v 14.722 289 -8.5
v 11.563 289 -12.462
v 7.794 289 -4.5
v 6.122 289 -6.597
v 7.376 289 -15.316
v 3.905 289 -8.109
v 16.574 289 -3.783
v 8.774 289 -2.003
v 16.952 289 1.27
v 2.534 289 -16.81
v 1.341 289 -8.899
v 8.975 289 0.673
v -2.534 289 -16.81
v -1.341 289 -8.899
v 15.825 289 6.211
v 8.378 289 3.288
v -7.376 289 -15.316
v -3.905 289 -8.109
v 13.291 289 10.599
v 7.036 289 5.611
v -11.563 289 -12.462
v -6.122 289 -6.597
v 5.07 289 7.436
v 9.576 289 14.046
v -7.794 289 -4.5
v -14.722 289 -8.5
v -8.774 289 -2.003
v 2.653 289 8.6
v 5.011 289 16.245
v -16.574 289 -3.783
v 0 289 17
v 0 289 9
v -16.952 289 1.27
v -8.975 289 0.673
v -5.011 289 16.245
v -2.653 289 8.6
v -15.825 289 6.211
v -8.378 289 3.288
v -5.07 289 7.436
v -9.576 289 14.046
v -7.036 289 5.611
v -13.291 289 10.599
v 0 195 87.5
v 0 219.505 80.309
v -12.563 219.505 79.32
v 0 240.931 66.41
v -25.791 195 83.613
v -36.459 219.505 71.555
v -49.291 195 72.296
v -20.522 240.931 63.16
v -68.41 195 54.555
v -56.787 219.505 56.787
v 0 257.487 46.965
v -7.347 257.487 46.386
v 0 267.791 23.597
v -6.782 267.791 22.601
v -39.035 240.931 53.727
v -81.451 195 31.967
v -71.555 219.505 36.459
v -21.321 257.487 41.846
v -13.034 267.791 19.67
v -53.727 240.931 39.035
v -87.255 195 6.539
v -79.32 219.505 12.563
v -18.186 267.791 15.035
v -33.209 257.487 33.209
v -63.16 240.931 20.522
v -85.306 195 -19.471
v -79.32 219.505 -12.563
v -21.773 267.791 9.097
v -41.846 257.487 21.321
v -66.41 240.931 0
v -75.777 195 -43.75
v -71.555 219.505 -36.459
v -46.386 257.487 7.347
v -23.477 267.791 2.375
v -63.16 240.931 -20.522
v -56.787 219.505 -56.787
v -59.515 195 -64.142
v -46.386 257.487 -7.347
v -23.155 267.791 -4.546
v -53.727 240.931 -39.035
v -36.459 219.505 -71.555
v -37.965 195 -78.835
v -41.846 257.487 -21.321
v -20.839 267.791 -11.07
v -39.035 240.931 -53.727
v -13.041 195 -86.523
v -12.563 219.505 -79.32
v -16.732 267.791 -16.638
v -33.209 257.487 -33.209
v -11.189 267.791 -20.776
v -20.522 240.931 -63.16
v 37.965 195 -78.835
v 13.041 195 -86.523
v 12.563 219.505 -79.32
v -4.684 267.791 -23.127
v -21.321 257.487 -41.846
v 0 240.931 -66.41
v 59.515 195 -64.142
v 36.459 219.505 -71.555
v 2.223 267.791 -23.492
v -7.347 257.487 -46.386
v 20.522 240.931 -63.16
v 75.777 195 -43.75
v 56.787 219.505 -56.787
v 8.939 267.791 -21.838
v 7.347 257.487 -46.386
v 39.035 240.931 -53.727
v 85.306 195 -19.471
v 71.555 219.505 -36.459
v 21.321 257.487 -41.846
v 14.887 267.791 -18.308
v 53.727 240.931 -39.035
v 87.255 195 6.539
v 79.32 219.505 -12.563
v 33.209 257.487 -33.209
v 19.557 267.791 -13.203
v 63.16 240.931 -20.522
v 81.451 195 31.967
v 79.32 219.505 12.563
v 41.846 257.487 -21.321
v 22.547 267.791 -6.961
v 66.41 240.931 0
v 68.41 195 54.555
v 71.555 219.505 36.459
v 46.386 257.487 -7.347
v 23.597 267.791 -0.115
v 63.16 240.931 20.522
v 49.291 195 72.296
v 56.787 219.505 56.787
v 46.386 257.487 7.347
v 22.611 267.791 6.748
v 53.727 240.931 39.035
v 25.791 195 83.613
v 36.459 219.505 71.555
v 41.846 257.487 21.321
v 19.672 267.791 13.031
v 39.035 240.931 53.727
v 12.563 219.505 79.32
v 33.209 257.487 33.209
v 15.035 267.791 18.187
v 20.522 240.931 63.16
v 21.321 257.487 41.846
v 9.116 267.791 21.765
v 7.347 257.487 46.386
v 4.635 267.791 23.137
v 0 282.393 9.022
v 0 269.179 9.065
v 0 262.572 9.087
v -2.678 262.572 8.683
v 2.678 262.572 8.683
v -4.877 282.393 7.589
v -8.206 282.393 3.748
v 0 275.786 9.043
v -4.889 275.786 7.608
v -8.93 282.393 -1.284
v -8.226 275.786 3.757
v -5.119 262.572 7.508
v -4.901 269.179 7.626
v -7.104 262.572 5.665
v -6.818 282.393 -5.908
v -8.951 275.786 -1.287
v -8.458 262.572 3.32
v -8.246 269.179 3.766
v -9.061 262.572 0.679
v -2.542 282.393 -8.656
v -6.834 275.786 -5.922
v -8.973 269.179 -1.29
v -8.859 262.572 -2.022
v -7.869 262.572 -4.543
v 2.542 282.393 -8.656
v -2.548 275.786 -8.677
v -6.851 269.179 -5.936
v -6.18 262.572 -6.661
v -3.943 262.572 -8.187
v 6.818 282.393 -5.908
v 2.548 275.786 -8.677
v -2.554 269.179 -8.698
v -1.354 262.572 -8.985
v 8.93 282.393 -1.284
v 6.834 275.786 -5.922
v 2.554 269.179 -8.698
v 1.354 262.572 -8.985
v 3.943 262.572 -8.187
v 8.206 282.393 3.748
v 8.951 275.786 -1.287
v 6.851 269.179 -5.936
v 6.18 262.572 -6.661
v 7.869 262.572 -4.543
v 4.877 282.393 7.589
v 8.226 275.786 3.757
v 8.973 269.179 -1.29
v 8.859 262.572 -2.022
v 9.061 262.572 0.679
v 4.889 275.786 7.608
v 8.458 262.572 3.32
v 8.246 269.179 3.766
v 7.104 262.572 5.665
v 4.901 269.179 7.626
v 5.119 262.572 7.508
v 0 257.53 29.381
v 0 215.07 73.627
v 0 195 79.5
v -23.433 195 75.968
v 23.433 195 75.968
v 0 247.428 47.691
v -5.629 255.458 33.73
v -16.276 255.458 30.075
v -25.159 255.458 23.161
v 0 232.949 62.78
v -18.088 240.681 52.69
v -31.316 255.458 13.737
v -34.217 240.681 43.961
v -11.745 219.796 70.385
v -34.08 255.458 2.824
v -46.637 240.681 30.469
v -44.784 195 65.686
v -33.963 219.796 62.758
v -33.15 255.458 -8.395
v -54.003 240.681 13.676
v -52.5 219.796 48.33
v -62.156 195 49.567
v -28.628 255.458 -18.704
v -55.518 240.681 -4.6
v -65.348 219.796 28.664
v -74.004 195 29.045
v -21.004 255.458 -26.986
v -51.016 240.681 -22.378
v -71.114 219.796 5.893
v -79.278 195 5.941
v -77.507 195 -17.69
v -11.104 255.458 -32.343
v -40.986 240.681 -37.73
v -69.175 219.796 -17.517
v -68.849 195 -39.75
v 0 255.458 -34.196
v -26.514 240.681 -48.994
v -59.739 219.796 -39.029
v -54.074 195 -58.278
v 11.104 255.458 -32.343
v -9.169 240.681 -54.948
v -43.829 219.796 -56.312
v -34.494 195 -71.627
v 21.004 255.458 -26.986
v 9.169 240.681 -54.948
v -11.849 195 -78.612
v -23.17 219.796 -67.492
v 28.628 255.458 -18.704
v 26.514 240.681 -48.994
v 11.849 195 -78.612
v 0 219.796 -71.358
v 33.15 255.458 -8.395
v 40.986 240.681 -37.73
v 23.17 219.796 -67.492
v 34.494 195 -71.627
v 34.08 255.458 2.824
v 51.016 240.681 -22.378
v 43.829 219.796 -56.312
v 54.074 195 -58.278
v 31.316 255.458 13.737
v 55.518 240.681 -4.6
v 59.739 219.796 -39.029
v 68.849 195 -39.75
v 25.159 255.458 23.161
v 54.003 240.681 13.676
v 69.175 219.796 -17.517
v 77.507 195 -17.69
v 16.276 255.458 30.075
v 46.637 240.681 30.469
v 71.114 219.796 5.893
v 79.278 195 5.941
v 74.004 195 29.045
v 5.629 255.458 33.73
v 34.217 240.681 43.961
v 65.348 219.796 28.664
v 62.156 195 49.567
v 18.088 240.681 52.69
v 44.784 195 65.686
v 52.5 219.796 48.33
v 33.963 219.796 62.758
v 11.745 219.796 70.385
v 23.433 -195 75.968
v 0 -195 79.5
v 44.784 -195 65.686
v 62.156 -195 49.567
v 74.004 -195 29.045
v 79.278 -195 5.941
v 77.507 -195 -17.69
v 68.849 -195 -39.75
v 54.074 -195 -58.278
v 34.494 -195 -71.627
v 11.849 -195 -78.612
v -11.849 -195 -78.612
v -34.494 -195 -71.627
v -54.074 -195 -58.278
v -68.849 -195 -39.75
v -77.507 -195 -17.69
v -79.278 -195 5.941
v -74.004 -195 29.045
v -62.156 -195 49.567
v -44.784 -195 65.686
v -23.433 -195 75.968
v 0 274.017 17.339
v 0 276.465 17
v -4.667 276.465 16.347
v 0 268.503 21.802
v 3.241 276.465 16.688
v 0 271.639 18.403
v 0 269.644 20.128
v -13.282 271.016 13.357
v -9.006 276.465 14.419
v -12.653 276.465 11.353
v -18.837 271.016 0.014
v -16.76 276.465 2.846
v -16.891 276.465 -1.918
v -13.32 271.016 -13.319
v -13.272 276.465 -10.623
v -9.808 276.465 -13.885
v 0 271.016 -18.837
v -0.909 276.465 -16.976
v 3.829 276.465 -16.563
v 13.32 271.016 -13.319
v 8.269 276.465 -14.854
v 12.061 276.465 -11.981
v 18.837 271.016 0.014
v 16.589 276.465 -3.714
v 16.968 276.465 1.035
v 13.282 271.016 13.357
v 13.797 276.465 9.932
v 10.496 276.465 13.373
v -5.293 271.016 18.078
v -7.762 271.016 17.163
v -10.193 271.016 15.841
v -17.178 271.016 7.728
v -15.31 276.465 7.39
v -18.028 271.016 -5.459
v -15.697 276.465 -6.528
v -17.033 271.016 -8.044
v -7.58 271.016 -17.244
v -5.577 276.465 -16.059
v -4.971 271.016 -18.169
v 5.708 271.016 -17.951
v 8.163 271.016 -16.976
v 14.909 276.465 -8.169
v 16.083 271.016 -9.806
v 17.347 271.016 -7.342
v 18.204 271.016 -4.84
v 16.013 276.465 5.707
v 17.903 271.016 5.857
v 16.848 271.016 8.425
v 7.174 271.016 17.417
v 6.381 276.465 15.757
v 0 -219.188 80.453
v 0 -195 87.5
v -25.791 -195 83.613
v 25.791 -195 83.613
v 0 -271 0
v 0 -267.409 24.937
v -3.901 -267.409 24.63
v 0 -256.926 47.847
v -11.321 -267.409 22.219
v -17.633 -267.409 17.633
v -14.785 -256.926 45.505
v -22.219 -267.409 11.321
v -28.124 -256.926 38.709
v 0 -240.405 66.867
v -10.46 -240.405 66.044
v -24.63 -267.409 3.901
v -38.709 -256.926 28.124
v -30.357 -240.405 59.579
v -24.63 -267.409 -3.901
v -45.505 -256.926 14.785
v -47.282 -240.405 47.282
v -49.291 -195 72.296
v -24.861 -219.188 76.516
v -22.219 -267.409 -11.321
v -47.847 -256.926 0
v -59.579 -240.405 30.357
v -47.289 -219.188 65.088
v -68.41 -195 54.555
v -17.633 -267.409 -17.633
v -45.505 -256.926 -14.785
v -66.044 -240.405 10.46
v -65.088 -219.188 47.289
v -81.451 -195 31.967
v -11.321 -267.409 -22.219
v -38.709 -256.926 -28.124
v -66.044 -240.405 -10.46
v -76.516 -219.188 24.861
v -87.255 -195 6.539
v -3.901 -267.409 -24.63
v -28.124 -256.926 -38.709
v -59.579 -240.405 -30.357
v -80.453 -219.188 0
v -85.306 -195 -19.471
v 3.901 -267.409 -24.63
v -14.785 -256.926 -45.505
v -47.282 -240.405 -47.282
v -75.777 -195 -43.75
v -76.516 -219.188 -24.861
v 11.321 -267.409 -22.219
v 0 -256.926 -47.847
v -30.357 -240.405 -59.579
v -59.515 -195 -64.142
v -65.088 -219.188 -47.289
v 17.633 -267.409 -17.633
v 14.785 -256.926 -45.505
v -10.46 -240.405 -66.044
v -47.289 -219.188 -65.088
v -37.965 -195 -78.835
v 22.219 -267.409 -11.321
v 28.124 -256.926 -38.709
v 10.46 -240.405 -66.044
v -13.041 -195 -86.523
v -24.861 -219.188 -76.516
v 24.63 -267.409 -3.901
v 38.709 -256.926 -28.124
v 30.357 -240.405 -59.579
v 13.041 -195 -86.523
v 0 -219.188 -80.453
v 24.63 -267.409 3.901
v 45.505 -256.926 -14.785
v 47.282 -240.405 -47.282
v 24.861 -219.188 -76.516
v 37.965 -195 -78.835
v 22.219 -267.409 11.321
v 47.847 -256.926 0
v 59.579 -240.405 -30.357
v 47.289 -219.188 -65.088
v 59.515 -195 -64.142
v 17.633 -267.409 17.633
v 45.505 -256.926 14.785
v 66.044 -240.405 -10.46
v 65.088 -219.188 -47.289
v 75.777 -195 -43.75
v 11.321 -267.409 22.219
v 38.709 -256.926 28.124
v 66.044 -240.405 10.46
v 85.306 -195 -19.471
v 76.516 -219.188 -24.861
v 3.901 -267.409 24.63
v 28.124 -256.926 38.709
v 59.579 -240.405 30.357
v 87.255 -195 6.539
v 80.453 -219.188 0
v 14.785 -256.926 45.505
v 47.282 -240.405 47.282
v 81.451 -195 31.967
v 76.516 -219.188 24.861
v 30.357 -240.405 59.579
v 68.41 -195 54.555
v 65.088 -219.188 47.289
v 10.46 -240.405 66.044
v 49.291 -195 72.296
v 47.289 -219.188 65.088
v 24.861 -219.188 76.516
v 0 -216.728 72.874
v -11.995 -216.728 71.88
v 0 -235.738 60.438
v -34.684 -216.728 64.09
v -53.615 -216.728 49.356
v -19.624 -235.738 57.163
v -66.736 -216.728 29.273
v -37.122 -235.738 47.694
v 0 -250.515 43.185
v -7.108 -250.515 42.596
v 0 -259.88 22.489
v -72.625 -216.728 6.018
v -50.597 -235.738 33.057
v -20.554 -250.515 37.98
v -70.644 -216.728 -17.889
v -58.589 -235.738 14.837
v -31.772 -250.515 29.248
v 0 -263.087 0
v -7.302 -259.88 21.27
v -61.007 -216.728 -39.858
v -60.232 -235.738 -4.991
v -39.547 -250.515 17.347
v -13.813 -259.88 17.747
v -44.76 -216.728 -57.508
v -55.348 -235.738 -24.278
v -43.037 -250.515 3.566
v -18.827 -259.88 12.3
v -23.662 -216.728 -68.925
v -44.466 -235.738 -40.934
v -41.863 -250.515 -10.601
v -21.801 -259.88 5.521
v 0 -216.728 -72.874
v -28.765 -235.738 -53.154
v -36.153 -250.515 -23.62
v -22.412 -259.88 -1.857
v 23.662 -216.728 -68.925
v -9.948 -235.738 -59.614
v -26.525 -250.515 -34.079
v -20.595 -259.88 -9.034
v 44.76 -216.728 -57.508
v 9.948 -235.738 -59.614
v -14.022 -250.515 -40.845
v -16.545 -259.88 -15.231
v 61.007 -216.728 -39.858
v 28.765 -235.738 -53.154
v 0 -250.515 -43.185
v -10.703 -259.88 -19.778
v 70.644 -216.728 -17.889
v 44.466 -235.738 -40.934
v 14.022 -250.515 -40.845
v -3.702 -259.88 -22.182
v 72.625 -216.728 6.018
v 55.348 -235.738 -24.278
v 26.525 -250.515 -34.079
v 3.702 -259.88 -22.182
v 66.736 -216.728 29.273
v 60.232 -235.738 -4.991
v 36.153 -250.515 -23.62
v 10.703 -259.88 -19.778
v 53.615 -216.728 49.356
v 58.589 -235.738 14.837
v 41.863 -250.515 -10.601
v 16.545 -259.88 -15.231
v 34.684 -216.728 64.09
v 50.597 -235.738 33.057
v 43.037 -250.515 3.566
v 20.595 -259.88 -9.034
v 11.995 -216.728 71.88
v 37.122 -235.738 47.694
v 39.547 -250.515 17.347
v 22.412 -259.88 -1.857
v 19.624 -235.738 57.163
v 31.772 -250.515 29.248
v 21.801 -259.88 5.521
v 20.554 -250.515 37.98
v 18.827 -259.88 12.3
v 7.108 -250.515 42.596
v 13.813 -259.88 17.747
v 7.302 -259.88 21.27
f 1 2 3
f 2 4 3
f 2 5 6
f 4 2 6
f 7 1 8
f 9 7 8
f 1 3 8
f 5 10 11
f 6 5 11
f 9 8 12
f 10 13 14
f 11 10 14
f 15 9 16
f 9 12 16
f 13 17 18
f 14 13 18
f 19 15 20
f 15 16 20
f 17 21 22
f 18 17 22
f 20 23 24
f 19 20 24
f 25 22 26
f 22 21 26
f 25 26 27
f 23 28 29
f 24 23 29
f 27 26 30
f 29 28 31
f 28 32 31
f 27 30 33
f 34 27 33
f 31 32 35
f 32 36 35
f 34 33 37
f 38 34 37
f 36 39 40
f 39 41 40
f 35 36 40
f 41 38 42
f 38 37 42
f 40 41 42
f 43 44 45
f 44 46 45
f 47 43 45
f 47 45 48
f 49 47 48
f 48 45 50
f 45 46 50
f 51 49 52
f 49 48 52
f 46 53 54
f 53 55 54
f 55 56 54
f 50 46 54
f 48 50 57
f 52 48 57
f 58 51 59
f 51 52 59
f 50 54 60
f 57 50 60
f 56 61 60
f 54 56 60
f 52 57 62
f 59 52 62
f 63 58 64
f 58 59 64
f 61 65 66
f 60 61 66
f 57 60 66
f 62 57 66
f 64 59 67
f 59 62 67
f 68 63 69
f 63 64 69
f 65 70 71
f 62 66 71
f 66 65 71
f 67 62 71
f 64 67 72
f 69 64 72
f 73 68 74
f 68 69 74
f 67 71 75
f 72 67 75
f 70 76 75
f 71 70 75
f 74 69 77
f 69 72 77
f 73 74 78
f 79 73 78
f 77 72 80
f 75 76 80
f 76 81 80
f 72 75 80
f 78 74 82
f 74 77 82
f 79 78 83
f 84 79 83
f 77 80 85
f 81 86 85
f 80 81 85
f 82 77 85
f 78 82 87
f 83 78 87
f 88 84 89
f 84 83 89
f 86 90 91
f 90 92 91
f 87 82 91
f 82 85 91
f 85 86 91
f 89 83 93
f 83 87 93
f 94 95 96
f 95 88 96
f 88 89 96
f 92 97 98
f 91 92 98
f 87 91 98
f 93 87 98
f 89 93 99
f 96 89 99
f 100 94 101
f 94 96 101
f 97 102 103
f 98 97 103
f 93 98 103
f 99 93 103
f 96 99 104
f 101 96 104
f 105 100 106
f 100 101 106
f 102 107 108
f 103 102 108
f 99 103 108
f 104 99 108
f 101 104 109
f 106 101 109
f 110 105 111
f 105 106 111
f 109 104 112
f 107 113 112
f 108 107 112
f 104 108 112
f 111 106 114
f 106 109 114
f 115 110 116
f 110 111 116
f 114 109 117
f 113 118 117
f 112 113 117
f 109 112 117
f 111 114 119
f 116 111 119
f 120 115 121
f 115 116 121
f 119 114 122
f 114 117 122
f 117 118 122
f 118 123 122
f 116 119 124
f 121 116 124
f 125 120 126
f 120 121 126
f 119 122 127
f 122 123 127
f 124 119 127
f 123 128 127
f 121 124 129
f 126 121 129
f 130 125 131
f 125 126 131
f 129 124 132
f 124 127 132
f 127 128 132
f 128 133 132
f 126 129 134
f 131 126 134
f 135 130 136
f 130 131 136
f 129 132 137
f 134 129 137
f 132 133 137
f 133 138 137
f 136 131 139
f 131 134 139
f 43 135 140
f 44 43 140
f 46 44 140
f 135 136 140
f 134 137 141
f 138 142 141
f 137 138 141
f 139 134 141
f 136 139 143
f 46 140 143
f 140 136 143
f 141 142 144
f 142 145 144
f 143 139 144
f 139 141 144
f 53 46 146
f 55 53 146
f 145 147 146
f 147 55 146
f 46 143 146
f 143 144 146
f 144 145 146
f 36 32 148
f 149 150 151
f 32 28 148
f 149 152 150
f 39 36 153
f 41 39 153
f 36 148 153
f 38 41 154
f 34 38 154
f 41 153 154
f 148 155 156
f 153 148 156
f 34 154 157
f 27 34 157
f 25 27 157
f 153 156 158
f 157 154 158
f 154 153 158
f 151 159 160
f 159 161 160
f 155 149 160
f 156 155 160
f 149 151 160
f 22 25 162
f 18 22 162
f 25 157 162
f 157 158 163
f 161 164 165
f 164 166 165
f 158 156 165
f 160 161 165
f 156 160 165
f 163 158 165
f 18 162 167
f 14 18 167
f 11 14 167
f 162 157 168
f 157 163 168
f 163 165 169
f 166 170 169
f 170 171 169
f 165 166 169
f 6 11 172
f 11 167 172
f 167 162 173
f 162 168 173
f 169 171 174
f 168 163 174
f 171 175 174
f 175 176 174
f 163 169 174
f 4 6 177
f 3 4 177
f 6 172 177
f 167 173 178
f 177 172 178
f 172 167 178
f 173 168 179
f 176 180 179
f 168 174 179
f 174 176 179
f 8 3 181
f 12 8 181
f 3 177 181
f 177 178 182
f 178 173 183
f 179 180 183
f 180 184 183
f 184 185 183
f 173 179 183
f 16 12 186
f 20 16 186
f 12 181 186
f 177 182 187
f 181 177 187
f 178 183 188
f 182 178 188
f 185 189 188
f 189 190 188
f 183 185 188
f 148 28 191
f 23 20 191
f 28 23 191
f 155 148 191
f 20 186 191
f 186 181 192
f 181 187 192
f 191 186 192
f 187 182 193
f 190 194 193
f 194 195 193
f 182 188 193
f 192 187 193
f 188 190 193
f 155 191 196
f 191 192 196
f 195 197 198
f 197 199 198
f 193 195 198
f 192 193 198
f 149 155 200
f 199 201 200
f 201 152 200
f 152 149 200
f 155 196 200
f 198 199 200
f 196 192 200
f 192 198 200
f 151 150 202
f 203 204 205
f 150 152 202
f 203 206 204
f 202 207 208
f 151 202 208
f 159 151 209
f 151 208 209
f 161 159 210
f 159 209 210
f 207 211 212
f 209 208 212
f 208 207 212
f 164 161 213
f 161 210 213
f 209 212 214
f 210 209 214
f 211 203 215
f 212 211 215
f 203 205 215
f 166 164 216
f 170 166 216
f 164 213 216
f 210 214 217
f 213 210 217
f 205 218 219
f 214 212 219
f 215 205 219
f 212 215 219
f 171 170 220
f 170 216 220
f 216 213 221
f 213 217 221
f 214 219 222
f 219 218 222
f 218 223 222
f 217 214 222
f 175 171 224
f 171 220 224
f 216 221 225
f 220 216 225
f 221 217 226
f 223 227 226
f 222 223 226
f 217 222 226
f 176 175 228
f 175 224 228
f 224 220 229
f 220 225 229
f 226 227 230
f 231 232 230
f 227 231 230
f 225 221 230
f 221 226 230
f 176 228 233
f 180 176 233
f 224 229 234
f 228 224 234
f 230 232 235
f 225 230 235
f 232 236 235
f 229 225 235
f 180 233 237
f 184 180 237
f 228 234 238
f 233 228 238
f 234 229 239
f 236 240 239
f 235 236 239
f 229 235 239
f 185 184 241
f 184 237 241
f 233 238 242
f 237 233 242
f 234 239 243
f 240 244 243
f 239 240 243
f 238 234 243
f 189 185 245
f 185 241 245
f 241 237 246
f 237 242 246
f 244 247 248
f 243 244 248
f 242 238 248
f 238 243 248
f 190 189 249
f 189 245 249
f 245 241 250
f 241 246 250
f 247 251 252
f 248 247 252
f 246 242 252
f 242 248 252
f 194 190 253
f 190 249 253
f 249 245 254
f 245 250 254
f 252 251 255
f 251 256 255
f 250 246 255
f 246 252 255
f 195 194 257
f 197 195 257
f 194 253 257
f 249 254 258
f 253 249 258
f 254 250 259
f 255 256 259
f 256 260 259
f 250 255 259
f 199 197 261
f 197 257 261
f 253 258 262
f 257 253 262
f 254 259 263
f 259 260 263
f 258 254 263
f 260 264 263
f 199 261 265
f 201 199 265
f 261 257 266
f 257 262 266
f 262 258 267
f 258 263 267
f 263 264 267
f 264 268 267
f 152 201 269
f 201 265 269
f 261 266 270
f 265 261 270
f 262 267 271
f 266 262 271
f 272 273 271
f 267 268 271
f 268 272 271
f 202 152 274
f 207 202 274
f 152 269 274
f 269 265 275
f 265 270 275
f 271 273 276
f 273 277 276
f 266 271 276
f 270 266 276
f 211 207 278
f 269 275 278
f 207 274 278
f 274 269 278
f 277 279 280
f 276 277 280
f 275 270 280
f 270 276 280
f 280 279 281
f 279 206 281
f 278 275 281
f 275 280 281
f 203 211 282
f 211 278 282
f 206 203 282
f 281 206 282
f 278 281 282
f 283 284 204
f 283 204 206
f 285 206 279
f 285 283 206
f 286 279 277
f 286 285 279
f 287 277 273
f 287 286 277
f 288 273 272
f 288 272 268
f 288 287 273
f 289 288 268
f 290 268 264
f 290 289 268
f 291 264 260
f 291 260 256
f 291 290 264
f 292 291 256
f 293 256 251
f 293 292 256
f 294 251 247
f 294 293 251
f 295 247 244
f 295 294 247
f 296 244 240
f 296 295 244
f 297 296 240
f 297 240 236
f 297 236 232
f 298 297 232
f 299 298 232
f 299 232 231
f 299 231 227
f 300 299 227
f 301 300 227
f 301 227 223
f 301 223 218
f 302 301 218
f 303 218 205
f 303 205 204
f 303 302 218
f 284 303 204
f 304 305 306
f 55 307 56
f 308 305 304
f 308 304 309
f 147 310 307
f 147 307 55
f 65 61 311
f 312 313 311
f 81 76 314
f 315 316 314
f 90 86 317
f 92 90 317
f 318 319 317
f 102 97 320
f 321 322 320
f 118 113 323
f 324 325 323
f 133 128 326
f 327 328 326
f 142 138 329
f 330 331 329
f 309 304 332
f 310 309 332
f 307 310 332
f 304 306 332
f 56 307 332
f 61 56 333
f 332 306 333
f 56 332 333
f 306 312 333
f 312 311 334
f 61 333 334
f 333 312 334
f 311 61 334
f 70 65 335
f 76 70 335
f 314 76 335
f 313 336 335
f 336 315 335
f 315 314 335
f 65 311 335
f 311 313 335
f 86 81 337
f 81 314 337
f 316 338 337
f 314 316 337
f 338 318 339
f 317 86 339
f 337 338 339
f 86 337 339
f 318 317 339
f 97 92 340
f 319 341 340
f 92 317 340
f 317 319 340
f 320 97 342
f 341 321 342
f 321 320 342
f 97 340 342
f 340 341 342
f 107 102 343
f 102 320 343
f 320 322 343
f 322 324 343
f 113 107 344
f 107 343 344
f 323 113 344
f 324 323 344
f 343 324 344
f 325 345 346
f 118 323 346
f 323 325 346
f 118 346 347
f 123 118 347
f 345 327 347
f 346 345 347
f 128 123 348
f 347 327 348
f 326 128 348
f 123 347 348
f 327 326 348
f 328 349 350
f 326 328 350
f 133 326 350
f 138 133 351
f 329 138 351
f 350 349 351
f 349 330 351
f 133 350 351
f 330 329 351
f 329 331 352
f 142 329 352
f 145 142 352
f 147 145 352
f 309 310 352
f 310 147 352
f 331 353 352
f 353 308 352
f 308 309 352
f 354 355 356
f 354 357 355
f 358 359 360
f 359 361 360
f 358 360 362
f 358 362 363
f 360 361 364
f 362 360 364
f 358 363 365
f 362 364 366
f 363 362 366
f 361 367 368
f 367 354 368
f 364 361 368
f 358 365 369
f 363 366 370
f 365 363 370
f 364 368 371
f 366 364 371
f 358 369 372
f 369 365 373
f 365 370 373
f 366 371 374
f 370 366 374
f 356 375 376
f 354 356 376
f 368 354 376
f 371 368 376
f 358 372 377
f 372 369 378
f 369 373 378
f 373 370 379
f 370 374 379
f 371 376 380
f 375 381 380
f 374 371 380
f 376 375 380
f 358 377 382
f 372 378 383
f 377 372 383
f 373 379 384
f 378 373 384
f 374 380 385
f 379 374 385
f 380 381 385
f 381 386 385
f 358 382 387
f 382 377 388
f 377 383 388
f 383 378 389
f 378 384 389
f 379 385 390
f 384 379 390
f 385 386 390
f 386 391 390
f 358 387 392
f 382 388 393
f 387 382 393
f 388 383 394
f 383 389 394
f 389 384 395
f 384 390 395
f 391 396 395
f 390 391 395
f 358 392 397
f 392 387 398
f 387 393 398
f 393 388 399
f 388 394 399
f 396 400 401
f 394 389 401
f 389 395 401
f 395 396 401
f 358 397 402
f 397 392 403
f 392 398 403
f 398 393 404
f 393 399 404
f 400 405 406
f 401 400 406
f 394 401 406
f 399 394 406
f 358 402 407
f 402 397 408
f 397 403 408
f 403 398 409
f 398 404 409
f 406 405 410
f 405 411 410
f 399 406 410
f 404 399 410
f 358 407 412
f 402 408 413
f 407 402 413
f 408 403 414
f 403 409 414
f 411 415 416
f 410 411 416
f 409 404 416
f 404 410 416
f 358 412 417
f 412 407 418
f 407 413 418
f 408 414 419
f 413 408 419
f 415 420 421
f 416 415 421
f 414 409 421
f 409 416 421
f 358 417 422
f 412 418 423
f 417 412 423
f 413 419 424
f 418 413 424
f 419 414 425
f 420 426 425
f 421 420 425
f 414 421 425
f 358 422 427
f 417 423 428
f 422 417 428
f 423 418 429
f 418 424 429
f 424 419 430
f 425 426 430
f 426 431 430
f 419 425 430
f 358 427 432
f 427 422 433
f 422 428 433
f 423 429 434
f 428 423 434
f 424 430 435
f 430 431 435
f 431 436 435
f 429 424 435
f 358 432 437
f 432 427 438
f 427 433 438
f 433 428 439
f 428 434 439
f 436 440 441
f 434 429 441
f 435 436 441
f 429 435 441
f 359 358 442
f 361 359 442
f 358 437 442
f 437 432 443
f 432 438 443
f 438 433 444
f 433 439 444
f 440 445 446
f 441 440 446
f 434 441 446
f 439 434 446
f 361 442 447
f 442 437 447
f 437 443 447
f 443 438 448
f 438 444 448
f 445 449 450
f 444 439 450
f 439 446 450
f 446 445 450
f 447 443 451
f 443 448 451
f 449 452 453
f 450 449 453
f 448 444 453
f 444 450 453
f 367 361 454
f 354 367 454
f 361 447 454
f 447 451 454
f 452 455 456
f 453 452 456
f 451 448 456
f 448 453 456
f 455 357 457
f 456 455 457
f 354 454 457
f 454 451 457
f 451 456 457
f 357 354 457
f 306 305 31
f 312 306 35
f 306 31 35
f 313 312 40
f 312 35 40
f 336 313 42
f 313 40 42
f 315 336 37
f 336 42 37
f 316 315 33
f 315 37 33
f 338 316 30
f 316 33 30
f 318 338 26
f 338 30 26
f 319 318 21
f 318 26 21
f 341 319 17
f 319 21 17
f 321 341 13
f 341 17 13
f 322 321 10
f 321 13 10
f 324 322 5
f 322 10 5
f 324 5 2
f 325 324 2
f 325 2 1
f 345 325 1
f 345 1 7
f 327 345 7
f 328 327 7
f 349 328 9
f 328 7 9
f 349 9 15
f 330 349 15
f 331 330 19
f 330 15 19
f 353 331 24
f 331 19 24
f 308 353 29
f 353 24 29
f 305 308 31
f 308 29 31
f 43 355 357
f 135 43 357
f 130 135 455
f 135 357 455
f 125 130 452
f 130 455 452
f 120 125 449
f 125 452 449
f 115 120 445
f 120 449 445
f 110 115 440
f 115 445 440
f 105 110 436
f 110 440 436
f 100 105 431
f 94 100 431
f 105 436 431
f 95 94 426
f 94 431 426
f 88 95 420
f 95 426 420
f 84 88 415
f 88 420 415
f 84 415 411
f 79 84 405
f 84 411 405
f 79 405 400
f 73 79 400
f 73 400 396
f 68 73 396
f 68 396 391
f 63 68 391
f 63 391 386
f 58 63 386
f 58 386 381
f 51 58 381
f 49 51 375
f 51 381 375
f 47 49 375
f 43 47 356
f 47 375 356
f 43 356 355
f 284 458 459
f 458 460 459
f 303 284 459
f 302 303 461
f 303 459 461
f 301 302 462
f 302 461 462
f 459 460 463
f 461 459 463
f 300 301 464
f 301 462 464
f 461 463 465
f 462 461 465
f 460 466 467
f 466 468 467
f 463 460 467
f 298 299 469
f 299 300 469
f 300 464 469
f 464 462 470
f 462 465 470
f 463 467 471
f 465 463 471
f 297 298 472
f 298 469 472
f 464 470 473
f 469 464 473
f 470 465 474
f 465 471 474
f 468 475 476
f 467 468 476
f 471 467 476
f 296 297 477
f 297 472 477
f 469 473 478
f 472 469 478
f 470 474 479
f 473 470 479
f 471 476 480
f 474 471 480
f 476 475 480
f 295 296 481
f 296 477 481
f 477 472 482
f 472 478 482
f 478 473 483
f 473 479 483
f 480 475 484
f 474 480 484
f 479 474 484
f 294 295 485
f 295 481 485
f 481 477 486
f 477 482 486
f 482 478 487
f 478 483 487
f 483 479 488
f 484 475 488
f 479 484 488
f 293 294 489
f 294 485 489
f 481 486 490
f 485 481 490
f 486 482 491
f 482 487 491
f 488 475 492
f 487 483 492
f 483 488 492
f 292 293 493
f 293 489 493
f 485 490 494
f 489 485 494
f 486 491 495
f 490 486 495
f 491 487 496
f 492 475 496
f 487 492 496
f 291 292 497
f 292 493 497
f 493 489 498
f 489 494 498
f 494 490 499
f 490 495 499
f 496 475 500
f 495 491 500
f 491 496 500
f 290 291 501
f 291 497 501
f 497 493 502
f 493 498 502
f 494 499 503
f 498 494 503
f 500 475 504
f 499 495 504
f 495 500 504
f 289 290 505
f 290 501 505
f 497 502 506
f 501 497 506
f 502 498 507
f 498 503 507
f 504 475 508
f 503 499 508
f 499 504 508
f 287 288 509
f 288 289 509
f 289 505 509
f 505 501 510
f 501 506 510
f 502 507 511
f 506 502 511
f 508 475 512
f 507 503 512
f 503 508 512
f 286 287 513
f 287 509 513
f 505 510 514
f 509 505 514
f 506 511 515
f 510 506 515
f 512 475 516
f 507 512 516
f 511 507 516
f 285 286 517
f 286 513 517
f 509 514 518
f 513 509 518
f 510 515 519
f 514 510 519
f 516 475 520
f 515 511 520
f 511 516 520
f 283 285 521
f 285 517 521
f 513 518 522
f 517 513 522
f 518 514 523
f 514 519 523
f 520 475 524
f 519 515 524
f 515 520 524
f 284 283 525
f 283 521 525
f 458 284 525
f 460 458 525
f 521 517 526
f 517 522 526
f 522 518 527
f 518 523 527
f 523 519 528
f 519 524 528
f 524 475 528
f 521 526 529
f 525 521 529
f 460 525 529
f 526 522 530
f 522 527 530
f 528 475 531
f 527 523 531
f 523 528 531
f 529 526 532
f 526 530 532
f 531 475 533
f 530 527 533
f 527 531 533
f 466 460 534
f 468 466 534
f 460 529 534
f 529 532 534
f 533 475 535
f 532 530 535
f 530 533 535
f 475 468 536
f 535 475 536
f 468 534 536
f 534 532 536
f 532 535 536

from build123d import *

# Parameters (mm, degrees)
Y_KSEKLIK_EKSTR_ZYON1_DEPTH      = 195
Y_KSEKLIK_EKSTR_ZYON1_DEPTH_BACK = 195
IZIM2_R                          = 87.5
IZIM2_R_2                        = 79.5
RADYUS1_R                        = 9


with BuildPart() as part:
    # Çizim2 → Yükseklik-Ekstrüzyon1 (new, two sides: drawn at the far end of the back side and taken through both)
    with BuildSketch(Plane(origin=(0, 0, 0), x_dir=(1, 0, 0), z_dir=(0, 1, 0)).offset(-Y_KSEKLIK_EKSTR_ZYON1_DEPTH_BACK)):
        Circle(IZIM2_R)
        Circle(IZIM2_R_2, mode=Mode.SUBTRACT)
    extrude(amount=Y_KSEKLIK_EKSTR_ZYON1_DEPTH + Y_KSEKLIK_EKSTR_ZYON1_DEPTH_BACK)

    # Çizim3 → Döndür1 (revolve)
    with BuildSketch(Plane(origin=(0, 0, 0), x_dir=(0, 0, -1), z_dir=(1, 0, 0))):
        with BuildLine():
            Line((-9.025918617, 281.086559343), (-9, 289))
            Line((-9, 289), (-17, 289))
            Line((-17, 289), (-17, 269.349416033))
            ThreePointArc((-17, 269.349416033), (-64.125045155, 243.434926699), (-87.5, 195))
            Line((-87.5, 195), (-79.5, 195))
            ThreePointArc((-79.5, 195), (-55.708005592, 240.680658931), (-9.086559343, 262.571806636))
            Line((-9.086559343, 262.571806636), (-9.025918617, 281.086559343))
        make_face()
    revolve(axis=Axis((0, 271, 0), (0, -1, 0)))

    # Çizim4 → Döndür2 (revolve)
    with BuildSketch(Plane(origin=(0, 0, 0), x_dir=(0, 0, -1), z_dir=(1, 0, 0))):
        with BuildLine():
            Line((87.5, -195), (79.5, -195))
            ThreePointArc((79.5, -195), (52.335527042, -243.73853538), (0, -263.086559343))
            Line((0, -263.086559343), (0, -271))
            ThreePointArc((0, -271), (57.94879205, -249.347293478), (87.5, -195))
        make_face()
    revolve(axis=Axis((0, 271, 0), (0, -1, 0)))

    # Radyus1
    radyus1_edges = [part.edges().sort_by_distance(p)[0] for p in [
        (0, 269.349416033, -17),
    ]]
    fillet(radyus1_edges, radius=RADYUS1_R)


solid = part.part
